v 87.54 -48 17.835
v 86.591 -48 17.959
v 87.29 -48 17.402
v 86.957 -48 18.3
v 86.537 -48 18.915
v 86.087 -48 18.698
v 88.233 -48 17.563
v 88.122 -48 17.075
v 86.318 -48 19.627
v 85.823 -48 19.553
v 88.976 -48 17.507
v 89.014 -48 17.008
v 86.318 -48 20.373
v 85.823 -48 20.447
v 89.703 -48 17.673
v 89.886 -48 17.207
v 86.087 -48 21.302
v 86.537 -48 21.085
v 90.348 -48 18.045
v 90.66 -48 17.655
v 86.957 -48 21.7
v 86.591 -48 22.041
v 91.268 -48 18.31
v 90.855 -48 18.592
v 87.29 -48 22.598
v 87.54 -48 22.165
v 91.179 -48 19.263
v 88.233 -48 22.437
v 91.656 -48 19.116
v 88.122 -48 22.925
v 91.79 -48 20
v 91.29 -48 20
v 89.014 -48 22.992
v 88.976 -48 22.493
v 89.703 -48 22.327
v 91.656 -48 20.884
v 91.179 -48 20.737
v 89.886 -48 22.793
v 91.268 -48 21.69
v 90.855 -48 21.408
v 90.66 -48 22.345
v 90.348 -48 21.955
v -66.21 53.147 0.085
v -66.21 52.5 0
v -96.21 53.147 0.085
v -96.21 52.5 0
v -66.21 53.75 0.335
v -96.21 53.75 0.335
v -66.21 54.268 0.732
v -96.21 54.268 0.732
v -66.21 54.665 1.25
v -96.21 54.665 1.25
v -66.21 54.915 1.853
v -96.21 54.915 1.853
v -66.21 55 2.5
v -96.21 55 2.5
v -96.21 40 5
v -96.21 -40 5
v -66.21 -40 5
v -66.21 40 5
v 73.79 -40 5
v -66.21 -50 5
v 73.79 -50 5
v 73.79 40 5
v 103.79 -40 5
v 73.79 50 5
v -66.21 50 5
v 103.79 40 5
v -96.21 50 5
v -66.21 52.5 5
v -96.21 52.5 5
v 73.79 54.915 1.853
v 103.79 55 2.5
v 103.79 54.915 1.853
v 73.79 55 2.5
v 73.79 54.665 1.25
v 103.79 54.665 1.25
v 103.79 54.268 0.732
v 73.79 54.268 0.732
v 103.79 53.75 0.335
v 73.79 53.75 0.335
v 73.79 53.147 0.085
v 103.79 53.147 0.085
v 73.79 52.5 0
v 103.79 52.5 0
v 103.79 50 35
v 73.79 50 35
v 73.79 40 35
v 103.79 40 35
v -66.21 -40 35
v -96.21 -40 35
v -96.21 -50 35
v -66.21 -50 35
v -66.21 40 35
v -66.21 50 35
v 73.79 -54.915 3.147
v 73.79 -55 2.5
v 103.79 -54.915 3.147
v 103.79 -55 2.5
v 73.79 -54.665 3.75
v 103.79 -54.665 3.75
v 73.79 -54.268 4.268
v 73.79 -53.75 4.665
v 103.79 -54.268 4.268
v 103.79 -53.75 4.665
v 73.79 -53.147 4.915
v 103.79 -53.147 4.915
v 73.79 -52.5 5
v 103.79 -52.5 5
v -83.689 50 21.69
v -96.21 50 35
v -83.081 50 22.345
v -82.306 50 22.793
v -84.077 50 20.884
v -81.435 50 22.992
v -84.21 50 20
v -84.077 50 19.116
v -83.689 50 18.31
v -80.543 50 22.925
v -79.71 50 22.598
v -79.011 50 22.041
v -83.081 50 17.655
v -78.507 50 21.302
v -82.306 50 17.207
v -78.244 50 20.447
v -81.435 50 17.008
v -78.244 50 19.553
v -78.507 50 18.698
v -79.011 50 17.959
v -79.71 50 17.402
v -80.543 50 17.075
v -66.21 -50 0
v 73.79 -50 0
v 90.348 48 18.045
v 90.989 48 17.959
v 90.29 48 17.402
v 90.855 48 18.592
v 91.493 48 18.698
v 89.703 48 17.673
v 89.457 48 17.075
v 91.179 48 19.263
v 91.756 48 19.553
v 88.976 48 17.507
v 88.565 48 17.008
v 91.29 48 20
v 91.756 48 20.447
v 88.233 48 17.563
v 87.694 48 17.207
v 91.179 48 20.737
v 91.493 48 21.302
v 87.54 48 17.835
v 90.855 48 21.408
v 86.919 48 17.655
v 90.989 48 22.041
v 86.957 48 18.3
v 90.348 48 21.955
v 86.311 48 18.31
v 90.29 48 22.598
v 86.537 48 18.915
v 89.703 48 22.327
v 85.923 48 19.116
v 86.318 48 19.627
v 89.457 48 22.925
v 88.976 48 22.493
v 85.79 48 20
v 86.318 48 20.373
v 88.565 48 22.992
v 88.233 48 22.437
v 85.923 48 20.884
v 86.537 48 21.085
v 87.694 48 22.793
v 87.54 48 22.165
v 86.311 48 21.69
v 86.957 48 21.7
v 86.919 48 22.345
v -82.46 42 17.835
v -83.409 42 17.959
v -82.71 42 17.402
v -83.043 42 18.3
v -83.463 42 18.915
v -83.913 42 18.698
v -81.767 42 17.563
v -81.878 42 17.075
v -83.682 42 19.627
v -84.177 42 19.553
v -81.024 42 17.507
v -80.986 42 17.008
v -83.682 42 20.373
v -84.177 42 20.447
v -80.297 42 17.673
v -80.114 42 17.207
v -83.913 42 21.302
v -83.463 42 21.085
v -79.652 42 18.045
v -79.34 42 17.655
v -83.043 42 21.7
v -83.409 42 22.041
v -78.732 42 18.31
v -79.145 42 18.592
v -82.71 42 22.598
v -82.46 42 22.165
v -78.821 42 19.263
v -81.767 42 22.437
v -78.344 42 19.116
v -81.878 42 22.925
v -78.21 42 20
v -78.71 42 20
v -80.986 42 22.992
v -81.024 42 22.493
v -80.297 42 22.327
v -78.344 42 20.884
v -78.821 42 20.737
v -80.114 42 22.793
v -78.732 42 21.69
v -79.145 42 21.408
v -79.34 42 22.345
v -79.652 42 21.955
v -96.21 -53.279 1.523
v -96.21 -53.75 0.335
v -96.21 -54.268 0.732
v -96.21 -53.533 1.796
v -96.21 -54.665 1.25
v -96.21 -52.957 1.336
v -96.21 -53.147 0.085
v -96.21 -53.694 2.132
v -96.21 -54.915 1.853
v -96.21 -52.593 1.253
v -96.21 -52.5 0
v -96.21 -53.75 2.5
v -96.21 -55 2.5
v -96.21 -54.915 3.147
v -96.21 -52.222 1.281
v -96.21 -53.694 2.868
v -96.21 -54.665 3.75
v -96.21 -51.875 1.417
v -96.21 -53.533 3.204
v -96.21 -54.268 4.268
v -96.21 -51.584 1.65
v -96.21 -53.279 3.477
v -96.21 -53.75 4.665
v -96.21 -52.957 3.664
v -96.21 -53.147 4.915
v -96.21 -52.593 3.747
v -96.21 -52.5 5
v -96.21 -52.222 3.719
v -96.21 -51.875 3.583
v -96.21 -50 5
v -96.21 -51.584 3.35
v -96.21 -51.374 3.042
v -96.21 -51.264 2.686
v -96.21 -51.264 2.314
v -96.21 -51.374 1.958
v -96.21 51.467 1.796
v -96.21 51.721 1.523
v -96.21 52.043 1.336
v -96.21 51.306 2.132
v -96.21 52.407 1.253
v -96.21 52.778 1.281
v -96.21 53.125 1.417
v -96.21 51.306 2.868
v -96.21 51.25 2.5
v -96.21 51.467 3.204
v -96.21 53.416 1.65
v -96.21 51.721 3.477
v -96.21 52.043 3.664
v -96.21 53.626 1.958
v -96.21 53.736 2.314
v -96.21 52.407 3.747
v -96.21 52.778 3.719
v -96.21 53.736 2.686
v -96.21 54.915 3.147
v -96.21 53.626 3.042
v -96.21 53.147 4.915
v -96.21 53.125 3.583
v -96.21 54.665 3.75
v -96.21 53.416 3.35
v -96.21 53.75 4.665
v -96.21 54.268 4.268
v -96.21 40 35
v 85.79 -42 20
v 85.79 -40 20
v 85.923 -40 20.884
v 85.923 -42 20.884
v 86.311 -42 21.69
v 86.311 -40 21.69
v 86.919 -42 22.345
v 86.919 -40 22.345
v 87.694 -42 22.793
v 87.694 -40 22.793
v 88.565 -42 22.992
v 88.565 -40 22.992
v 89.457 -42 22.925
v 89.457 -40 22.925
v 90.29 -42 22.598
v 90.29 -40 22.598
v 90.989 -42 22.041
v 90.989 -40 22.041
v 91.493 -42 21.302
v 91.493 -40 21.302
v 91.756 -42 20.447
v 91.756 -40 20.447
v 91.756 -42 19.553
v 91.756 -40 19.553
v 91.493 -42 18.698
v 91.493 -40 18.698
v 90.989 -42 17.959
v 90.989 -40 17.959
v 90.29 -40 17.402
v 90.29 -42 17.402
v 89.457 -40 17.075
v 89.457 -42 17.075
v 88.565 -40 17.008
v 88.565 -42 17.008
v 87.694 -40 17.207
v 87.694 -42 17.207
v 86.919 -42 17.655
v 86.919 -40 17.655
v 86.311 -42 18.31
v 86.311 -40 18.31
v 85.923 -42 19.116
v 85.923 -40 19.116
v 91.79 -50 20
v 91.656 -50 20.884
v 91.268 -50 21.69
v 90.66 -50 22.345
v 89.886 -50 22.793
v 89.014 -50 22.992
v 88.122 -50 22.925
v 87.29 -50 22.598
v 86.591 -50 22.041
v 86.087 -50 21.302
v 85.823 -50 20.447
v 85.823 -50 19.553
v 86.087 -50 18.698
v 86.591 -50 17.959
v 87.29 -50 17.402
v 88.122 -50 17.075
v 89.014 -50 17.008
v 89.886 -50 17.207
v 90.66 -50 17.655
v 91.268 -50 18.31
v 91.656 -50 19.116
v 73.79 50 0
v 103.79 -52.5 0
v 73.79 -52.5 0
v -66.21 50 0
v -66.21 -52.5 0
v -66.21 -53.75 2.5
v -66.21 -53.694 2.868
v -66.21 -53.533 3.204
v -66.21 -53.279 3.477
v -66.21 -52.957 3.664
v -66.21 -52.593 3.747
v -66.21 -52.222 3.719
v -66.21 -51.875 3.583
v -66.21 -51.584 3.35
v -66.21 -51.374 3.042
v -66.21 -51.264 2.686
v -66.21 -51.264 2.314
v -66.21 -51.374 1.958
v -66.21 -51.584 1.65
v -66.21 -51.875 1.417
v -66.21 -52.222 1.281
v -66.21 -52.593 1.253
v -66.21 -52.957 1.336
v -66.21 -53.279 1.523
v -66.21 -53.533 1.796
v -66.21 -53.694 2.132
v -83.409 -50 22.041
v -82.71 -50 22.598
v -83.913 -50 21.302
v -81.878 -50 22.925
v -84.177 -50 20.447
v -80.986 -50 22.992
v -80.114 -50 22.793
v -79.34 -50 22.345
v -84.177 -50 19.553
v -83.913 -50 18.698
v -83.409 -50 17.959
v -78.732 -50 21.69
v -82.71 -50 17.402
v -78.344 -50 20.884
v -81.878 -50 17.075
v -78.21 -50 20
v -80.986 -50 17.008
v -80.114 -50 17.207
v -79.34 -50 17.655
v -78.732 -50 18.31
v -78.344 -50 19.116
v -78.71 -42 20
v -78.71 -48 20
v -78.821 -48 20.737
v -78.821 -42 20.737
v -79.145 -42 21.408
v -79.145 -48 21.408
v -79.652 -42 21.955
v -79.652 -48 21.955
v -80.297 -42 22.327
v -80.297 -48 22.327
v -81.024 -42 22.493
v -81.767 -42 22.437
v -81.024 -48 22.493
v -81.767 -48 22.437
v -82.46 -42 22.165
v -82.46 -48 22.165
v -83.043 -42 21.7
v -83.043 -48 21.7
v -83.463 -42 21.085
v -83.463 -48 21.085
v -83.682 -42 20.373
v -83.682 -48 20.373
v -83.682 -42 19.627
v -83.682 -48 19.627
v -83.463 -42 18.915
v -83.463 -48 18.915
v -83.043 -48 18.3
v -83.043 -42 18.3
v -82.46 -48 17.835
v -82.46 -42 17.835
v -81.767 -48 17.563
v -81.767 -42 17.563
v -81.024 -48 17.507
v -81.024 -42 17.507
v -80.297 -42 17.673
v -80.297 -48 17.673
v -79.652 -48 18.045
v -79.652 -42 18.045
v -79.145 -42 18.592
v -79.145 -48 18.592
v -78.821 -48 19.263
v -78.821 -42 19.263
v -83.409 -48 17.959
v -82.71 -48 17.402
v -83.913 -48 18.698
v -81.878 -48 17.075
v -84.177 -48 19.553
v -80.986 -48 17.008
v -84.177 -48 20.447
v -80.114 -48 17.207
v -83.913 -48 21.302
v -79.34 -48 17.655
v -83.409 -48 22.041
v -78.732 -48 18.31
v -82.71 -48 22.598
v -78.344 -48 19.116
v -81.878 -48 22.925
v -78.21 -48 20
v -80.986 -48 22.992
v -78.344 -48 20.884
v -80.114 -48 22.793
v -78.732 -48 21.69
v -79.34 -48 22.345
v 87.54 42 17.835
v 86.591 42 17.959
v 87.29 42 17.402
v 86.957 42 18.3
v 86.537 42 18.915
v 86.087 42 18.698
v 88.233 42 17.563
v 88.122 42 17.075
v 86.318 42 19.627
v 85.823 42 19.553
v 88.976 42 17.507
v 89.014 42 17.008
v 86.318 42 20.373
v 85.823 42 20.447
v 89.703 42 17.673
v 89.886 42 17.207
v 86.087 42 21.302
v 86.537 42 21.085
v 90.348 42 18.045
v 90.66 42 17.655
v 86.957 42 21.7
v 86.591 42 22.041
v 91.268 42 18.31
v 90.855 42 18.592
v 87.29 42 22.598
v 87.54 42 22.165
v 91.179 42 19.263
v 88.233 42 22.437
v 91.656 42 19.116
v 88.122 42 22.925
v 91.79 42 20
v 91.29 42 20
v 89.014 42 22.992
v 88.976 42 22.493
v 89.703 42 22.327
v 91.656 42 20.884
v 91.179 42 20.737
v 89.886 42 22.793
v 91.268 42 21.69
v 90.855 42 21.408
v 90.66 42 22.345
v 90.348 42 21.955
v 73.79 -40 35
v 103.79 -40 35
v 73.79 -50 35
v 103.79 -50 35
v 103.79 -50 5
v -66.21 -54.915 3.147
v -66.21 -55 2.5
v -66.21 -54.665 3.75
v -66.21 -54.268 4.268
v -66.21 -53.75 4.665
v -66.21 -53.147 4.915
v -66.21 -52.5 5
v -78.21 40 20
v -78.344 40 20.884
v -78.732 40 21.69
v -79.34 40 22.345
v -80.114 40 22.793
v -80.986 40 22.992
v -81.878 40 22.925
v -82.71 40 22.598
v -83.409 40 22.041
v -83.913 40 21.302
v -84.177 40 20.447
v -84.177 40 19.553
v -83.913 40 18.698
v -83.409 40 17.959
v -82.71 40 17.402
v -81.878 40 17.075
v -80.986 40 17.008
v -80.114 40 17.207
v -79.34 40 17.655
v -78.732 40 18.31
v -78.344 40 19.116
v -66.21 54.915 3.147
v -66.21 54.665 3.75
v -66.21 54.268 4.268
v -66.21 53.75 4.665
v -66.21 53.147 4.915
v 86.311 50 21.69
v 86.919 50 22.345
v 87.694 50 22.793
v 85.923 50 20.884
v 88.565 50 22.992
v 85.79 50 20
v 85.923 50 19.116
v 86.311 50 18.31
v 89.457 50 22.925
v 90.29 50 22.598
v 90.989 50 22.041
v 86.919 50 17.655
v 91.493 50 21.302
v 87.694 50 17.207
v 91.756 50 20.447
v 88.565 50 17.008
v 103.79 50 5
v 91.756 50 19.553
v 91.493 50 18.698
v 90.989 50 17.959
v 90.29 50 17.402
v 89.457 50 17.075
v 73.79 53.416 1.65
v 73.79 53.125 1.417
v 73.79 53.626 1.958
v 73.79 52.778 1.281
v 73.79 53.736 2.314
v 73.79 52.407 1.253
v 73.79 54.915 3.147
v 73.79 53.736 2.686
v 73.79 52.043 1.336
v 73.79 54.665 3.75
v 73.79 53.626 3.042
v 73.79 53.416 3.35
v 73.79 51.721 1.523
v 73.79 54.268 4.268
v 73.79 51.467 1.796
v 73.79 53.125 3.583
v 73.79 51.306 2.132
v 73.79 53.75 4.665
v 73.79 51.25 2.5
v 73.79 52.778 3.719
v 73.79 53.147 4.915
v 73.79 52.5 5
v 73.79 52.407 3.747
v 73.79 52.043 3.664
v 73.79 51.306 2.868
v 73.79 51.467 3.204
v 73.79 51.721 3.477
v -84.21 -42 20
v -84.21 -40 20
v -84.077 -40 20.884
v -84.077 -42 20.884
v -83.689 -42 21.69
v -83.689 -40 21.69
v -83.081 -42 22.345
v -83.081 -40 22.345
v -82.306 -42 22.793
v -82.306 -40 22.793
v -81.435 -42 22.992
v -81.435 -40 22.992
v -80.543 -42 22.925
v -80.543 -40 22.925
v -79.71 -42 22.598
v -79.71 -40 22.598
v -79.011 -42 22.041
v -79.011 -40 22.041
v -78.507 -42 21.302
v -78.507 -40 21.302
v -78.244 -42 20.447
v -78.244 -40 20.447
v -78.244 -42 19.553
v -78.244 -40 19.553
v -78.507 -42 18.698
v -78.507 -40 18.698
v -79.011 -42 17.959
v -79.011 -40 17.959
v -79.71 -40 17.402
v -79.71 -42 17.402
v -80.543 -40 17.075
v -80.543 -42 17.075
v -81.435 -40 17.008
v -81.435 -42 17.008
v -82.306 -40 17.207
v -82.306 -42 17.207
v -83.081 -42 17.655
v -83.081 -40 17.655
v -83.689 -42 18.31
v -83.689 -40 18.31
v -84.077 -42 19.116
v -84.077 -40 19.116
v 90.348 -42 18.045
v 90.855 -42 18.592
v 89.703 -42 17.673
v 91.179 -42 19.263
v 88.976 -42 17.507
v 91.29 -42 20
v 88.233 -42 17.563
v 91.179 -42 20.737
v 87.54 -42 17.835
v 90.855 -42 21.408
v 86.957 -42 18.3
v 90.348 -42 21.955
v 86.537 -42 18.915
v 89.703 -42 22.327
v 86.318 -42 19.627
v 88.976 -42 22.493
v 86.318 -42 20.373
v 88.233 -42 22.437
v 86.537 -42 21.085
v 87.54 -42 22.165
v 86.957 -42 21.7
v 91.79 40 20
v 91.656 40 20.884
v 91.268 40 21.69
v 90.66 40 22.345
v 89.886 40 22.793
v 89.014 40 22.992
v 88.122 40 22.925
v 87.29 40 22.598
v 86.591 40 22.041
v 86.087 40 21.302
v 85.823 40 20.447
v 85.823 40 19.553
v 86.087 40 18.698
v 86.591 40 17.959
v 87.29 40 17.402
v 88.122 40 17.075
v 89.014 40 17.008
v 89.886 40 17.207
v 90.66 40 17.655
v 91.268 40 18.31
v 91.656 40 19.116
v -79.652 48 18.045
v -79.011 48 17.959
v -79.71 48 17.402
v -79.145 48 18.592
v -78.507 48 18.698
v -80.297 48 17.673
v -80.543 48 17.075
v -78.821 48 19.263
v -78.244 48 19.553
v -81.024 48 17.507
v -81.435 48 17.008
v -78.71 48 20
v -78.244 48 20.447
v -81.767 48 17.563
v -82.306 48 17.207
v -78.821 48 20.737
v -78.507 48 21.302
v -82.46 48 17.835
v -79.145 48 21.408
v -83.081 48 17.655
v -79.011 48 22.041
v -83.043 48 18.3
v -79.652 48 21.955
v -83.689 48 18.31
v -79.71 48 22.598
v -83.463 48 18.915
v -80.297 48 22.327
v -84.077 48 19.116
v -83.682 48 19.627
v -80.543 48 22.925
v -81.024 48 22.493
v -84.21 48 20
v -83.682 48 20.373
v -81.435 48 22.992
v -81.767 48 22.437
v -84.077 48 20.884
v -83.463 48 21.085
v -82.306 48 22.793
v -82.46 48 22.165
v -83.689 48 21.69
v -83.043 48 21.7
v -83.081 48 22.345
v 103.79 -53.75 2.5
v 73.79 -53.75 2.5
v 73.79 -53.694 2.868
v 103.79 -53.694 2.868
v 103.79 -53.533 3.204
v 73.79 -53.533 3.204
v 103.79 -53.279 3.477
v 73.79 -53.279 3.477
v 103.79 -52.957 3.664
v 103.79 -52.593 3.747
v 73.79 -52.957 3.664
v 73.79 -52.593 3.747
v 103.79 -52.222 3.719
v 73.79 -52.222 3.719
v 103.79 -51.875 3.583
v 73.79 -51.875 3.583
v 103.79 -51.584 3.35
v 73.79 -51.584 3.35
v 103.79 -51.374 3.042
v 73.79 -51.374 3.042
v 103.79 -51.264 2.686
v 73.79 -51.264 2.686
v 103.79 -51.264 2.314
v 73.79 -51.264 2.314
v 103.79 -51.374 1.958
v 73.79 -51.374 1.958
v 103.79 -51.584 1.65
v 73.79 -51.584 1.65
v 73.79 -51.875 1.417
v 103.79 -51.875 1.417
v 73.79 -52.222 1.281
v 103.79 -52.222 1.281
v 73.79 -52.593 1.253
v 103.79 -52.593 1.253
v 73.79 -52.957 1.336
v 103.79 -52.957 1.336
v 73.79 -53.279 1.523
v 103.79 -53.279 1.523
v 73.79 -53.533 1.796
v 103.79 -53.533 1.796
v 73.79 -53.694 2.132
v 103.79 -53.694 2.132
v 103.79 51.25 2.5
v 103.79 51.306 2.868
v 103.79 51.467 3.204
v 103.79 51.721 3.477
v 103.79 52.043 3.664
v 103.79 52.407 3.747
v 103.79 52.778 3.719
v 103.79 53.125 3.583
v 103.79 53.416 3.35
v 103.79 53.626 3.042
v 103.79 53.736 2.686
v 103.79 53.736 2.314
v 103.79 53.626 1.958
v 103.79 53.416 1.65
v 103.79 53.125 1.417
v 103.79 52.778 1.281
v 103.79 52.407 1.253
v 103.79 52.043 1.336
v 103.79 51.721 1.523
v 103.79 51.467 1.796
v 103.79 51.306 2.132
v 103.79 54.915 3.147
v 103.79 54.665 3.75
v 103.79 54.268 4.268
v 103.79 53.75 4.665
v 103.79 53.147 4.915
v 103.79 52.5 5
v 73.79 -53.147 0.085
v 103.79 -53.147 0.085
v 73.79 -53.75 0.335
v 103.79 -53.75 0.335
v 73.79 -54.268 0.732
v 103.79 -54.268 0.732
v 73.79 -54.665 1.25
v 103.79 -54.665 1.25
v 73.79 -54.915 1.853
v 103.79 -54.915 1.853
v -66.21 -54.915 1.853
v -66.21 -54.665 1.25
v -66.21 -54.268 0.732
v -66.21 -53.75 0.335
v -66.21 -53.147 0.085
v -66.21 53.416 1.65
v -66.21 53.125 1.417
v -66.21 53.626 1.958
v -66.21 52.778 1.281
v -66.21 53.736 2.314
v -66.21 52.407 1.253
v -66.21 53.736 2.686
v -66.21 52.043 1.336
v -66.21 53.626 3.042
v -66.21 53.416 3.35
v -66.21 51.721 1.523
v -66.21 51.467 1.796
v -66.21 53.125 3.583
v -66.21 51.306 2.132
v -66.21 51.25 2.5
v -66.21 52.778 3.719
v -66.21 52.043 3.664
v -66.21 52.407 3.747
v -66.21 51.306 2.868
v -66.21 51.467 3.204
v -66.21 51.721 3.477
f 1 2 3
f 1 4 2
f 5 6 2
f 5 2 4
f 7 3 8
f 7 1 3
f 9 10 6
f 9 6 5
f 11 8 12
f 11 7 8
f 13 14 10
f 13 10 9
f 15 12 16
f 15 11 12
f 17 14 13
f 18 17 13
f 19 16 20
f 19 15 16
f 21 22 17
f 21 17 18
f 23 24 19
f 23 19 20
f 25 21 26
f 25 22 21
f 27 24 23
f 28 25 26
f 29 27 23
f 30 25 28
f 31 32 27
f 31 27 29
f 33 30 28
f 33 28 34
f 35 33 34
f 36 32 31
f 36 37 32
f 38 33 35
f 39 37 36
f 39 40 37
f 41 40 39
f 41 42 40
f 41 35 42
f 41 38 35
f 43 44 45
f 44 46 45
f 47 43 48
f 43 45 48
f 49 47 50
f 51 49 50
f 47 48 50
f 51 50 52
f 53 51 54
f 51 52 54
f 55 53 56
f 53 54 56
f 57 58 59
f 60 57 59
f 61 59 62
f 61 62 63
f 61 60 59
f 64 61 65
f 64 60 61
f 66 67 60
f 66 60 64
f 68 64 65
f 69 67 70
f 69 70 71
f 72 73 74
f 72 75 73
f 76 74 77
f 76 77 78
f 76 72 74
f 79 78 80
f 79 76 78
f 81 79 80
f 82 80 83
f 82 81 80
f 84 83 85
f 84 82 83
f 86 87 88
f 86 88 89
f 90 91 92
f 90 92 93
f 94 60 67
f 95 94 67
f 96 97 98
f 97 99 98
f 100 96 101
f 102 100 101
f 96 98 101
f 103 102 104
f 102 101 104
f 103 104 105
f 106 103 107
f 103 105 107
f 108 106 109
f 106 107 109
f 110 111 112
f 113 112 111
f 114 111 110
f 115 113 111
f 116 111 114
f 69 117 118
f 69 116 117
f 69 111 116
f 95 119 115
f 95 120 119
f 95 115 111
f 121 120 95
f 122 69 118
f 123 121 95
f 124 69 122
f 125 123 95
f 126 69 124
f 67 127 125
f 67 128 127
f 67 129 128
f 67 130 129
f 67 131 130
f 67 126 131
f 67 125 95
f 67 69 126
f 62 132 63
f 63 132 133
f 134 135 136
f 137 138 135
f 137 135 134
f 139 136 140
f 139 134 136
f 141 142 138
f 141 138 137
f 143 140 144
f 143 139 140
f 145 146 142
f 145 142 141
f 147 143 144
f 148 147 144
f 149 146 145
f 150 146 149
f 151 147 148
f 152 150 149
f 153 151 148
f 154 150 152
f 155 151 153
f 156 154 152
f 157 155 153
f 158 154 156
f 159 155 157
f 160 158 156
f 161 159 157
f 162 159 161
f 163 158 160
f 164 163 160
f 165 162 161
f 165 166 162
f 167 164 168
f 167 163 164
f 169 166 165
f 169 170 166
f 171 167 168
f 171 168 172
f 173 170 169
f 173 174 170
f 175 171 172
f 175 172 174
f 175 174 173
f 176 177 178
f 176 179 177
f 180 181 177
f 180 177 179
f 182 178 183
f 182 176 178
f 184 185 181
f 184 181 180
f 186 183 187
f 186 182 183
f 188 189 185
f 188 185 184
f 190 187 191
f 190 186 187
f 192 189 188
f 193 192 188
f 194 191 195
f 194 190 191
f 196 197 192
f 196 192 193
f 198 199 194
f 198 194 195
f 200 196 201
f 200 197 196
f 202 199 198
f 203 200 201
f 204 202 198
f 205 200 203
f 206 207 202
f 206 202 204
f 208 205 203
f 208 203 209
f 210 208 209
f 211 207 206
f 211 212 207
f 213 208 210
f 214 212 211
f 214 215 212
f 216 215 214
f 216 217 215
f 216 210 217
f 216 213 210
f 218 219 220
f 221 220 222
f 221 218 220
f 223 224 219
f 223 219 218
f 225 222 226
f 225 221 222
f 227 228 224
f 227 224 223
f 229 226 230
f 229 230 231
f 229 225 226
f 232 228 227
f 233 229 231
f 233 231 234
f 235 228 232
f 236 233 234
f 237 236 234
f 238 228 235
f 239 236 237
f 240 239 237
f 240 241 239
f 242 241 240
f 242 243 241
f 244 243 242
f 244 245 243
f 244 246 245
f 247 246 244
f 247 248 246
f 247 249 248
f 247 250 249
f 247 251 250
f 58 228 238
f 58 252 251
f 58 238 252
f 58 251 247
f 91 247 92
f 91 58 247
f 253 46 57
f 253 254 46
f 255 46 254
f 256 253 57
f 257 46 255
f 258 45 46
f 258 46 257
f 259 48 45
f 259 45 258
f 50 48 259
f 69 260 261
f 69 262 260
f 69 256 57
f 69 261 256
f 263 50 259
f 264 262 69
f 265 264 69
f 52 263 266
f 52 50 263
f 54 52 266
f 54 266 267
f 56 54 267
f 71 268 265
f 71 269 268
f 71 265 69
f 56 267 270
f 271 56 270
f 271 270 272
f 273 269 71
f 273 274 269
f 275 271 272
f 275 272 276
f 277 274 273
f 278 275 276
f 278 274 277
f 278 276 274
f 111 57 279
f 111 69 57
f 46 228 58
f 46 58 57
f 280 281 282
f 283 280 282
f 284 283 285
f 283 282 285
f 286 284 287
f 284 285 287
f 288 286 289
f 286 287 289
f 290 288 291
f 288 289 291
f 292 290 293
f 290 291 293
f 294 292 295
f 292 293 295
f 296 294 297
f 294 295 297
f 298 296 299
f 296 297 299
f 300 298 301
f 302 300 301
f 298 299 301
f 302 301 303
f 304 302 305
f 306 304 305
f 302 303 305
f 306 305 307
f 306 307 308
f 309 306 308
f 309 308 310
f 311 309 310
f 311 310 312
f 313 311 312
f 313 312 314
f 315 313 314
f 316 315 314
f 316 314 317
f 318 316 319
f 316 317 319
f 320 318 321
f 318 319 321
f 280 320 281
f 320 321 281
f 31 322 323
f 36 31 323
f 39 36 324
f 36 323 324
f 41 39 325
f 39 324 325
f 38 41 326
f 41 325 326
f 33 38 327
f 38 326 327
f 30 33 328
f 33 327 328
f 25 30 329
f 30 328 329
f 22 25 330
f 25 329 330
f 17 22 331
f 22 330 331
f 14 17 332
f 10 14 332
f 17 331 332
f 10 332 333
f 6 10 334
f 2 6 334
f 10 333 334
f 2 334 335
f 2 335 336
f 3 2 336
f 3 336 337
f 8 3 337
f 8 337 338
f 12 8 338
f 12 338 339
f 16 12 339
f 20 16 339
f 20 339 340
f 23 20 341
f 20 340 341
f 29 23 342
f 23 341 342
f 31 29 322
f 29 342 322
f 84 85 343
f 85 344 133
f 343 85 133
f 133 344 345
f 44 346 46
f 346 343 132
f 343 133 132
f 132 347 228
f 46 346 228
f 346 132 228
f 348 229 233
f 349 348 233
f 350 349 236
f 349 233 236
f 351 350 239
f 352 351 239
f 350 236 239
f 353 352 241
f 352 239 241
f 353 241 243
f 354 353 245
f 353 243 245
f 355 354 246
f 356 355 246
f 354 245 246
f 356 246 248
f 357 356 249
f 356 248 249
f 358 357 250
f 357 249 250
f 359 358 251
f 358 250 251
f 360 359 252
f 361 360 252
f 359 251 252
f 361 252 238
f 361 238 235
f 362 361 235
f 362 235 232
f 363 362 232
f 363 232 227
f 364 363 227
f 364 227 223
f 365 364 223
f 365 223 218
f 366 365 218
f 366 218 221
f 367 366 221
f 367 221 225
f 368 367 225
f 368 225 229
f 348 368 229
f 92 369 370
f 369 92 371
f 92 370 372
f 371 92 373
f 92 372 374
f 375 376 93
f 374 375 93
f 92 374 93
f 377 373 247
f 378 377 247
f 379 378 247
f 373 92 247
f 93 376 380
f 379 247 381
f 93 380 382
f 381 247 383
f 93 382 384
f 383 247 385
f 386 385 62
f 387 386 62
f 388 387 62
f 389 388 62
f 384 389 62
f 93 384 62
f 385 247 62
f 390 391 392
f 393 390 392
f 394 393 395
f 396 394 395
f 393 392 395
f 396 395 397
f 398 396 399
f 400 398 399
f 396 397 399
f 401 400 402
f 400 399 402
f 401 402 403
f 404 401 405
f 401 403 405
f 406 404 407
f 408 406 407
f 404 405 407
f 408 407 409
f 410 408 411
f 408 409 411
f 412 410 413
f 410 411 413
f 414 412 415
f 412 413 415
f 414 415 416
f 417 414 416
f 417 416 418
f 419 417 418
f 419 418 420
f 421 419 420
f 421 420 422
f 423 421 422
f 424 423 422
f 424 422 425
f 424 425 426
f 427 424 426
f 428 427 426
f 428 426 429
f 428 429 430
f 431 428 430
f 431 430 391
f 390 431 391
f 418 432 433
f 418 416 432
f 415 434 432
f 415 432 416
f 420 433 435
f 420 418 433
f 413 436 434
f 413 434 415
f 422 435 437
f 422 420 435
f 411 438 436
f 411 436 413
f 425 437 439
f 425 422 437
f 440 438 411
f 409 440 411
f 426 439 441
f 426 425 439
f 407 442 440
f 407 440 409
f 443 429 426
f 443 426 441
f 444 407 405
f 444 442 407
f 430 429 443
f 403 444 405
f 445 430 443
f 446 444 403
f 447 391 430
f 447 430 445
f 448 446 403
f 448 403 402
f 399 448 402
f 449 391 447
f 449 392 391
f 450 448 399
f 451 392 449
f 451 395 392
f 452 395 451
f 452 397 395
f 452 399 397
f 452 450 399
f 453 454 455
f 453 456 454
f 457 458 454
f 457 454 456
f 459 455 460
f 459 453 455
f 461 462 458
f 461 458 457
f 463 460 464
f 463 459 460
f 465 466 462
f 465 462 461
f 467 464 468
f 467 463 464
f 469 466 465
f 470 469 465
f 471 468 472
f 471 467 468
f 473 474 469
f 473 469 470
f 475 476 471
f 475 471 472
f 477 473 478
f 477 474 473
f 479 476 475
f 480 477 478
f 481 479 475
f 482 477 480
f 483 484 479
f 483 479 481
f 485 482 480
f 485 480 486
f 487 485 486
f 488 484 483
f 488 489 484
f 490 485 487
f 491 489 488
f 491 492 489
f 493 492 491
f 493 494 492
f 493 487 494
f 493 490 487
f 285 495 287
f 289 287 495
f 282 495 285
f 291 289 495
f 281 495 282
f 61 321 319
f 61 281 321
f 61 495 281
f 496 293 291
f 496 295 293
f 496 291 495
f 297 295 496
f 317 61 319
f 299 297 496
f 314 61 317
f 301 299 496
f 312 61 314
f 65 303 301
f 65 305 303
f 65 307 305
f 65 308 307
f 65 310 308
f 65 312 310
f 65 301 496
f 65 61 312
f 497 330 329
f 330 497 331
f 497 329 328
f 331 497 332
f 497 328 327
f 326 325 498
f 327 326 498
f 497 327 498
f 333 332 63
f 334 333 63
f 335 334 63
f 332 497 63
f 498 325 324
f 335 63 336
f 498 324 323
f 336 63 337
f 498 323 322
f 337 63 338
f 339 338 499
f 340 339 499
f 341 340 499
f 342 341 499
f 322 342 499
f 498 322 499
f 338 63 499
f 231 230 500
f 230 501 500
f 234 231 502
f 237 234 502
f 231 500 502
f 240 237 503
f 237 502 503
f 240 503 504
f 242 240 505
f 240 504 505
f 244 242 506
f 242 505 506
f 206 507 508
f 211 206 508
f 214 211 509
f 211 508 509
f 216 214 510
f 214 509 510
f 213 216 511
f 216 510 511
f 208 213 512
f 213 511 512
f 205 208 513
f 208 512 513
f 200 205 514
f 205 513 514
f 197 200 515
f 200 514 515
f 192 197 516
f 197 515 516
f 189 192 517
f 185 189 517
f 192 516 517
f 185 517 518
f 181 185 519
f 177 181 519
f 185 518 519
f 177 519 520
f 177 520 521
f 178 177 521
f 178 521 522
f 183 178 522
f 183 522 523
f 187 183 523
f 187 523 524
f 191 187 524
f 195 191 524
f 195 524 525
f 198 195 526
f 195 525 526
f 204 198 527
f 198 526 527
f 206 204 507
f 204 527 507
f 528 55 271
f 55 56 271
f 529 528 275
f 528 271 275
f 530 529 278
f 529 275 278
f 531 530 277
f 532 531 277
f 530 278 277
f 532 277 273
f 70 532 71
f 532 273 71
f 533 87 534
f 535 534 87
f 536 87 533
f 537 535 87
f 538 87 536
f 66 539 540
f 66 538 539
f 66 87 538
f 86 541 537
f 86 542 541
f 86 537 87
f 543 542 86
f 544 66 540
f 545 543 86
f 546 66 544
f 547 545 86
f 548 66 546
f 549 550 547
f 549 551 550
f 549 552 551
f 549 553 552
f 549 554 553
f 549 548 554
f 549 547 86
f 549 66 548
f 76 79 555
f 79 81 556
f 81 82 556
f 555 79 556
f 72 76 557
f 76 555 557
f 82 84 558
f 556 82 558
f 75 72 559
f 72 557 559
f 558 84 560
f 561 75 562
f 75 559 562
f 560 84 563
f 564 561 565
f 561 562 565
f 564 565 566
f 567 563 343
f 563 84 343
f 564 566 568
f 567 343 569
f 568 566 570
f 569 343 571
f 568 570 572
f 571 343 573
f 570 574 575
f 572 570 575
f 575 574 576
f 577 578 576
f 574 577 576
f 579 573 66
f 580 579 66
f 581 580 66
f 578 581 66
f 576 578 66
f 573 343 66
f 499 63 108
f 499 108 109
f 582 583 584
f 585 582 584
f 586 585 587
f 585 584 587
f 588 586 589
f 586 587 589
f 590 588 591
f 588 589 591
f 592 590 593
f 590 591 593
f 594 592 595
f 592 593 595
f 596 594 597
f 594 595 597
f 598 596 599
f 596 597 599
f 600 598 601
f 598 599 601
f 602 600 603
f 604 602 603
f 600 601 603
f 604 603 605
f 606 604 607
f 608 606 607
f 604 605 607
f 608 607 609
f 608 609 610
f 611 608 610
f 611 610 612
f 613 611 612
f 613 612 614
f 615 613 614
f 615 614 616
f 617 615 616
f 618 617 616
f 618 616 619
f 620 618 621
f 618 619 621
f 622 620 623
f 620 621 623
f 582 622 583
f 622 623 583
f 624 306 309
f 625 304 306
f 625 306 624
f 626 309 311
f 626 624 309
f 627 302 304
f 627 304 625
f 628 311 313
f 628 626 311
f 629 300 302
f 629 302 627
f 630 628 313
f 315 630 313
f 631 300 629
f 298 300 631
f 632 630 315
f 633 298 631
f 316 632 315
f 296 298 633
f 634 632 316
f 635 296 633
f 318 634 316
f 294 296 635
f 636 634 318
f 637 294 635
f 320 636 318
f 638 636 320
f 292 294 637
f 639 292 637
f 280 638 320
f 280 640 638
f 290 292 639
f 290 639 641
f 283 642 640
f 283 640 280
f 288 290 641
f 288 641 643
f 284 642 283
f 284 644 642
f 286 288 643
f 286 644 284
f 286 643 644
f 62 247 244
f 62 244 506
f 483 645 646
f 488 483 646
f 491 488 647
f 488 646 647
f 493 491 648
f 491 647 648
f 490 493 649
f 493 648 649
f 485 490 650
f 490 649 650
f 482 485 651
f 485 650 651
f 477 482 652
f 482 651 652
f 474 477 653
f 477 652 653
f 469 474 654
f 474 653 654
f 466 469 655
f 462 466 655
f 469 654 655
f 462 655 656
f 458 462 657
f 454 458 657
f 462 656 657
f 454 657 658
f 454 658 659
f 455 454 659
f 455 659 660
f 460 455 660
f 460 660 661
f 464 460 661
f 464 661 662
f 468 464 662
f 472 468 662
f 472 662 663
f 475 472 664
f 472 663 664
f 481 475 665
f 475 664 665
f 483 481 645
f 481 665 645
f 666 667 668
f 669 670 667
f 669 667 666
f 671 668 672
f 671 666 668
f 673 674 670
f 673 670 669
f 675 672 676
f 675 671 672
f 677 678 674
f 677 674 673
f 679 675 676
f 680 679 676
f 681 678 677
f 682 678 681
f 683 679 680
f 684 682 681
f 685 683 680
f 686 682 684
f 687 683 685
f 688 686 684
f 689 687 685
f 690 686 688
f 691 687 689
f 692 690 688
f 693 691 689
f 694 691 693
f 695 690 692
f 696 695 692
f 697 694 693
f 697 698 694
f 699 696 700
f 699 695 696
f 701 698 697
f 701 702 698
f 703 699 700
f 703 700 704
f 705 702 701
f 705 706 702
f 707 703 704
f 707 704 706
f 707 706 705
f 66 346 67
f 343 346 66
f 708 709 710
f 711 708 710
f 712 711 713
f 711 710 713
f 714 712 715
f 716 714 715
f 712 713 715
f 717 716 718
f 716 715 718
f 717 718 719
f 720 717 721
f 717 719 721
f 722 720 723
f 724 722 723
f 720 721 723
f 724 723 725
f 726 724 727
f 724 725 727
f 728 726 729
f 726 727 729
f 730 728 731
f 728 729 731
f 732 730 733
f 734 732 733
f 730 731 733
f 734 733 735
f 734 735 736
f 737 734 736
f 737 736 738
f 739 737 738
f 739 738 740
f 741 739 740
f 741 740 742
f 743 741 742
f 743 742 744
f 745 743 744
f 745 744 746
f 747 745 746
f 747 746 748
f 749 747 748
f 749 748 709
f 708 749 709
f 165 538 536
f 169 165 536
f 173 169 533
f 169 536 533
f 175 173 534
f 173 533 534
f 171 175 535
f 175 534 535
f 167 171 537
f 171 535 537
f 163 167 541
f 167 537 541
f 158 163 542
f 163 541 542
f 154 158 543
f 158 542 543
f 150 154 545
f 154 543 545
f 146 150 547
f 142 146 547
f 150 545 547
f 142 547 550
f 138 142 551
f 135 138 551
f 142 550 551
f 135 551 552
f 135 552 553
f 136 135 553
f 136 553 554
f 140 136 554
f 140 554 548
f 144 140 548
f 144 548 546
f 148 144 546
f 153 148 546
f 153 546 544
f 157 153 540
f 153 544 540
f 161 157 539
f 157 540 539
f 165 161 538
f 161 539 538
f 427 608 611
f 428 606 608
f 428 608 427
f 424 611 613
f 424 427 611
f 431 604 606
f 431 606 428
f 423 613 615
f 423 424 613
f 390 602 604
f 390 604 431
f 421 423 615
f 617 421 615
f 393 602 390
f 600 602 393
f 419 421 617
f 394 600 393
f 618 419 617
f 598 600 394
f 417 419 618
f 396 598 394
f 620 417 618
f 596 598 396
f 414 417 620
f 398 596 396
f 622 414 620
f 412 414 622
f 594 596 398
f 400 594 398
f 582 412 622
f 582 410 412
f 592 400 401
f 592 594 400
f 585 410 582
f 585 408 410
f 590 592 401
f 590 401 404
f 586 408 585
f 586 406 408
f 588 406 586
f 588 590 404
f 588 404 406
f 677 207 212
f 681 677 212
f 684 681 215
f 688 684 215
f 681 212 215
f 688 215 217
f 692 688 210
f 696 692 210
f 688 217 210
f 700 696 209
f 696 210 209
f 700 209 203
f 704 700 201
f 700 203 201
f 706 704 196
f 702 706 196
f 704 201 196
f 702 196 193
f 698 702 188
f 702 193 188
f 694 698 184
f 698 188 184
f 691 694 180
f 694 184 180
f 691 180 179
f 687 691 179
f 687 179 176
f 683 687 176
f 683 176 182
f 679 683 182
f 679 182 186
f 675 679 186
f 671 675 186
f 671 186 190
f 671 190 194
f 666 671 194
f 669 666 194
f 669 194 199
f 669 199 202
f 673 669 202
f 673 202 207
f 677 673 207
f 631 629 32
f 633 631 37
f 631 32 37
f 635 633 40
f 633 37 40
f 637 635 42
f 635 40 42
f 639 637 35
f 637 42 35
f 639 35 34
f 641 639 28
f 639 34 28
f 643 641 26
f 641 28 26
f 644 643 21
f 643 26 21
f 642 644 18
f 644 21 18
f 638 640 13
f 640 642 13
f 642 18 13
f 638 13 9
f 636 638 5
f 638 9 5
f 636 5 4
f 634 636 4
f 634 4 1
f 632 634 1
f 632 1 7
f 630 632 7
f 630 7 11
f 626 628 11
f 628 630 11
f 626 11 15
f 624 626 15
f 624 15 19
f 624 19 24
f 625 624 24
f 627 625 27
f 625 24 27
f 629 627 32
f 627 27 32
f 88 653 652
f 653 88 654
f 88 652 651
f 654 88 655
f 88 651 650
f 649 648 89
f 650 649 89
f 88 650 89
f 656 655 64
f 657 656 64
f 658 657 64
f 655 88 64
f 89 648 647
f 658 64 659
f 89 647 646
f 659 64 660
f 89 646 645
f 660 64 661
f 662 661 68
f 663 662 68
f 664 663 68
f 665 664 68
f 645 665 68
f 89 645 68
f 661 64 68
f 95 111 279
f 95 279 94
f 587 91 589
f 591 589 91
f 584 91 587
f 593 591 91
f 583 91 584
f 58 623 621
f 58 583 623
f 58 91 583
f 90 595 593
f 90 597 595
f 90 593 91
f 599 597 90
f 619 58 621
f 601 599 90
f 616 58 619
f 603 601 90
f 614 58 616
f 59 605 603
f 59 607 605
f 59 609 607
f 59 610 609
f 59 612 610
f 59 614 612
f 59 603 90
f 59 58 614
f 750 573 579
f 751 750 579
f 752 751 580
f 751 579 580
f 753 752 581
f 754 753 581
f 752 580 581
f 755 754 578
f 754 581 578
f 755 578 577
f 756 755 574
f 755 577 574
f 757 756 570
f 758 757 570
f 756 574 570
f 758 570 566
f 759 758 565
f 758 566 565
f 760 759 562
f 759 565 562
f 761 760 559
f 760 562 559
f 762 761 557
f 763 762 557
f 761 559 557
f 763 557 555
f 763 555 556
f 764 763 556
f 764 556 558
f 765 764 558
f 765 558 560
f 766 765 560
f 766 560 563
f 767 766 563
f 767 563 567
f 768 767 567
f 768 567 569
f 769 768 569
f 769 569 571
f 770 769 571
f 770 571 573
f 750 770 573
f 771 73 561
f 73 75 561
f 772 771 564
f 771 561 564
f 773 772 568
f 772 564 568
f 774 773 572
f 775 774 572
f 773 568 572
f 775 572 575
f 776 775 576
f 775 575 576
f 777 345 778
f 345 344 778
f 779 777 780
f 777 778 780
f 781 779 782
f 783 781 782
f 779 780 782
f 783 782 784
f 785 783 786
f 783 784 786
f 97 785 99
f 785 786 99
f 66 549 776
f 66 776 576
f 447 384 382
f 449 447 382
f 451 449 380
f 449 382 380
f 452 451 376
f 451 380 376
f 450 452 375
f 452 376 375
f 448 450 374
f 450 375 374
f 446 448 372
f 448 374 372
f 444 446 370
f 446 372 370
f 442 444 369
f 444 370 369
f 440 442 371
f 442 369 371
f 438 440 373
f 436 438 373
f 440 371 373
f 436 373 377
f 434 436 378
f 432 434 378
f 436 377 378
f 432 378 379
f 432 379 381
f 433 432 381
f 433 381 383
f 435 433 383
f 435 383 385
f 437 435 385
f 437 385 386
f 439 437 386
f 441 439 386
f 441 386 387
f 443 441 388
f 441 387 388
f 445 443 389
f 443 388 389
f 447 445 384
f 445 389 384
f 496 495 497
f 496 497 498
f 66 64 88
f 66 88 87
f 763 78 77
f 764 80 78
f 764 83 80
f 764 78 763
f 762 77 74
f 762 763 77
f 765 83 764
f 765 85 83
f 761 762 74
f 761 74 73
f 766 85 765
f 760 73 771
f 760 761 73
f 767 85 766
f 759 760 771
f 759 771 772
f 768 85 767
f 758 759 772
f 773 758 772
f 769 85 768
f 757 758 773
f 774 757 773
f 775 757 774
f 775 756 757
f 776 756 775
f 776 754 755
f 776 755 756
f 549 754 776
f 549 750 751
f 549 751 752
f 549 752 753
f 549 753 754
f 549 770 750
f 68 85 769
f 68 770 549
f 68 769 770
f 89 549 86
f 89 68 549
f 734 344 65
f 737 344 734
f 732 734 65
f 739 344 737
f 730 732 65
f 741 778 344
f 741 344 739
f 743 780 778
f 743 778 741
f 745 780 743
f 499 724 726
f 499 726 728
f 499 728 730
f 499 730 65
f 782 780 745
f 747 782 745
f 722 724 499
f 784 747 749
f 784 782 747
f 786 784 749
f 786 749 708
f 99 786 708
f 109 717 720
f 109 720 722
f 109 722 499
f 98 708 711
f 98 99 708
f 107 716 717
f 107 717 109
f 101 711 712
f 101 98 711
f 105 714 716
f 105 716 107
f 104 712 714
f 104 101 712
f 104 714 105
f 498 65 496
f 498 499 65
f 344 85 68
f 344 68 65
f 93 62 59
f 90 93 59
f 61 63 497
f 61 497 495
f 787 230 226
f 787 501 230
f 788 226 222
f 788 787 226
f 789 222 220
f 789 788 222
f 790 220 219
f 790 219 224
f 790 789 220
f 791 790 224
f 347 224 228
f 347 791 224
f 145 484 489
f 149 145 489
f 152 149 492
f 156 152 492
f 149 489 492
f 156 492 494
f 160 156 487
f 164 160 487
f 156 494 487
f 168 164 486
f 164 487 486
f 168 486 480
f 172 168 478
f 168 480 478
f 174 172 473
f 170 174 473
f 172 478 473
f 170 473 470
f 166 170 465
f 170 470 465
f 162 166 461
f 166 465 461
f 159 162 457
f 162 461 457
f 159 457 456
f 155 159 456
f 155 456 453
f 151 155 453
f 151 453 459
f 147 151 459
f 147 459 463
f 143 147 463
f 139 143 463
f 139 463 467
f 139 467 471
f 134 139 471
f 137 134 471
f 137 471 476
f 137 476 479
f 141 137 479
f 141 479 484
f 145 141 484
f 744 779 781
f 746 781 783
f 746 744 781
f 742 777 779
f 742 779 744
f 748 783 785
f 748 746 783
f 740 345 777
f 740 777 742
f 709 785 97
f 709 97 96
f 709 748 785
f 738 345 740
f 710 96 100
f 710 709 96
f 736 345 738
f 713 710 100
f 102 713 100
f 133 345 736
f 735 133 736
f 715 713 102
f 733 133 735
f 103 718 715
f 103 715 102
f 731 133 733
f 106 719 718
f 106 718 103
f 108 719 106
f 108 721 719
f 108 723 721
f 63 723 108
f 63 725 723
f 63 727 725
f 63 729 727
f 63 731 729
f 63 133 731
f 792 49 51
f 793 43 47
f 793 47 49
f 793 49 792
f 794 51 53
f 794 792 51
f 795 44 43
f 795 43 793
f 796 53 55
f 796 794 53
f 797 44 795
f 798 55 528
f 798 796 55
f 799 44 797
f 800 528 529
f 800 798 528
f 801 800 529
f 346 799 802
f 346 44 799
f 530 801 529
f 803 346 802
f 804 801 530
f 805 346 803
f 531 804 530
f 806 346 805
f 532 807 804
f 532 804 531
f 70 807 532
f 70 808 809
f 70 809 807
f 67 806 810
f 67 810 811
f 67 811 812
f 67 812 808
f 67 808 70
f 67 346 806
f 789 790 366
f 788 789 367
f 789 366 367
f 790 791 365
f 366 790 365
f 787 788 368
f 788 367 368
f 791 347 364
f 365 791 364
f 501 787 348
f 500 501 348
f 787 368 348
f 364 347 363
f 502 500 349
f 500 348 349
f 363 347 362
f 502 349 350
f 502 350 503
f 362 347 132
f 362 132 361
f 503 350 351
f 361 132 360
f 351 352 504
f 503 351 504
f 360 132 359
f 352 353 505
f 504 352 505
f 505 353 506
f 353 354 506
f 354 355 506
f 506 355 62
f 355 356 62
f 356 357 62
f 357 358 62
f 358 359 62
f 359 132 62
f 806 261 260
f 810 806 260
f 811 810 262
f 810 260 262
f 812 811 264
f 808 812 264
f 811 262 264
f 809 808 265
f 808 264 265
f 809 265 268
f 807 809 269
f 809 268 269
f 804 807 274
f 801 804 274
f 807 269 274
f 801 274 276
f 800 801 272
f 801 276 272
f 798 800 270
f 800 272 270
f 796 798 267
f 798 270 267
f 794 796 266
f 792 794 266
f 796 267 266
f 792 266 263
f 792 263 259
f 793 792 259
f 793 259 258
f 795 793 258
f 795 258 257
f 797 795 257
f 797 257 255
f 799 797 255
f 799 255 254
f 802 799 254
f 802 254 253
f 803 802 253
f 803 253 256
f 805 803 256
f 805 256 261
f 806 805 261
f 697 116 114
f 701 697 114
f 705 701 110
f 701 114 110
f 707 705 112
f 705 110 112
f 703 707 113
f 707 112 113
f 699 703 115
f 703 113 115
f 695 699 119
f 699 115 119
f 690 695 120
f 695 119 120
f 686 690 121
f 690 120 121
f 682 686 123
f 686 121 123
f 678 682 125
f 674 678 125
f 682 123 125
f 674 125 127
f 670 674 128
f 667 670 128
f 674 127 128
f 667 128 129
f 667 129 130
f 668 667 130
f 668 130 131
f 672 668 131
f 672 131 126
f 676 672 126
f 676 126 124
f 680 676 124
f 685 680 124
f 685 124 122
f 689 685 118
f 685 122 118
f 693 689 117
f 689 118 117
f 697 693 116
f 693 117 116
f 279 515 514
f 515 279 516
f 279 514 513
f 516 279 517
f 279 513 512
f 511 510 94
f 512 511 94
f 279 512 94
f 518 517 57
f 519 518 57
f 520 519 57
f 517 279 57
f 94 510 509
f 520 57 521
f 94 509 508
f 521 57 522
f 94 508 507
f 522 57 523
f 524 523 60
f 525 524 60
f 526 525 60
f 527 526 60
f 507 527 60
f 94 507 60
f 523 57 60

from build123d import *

# Parameters (mm, degrees)
F0_W          = 200
F0_H          = 100
F1_DEPTH      = 5
F2_W          = 30
F2_H          = 10
F3_DEPTH      = 30
F4_R          = 2.5
F5_DEPTH      = 100.001
F6_R          = 3
F6_R_2        = 2.5
F7_DEPTH      = 2
F7_DEPTH_BACK = 25
F8_R          = 3
F8_R_2        = 2.5
F9_DEPTH      = 2
F10_R         = 3
F10_R_2       = 2.5
F11_DEPTH     = 2
F12_R         = 3
F12_R_2       = 2.5
F13_DEPTH     = 2
F14_R         = 3
F14_R_2       = 2.5
F15_DEPTH     = 2
F16_R         = 3
F16_R_2       = 2.5
F17_DEPTH     = 2
F18_W         = 30
F18_H         = 5
F19_DEPTH     = 5
F20_R         = 1.25
F21_DEPTH     = 200.001
F22_R         = 2.49999
F23_W         = 30
F23_H         = 5
F24_DEPTH     = 5
F25_R         = 1.25
F26_DEPTH     = 200.001
F27_R         = 2.49999


# Not quite as in the source:
# - a fillet or chamfer is up to 0.001 mm smaller than in the source, because OpenCascade refuses the exact size


with BuildPart() as f1:
    # F0 (on Top) → F1 (new body)
    with BuildSketch(Plane.XY):
        with Locations((3.7896726225, 0)):
            Rectangle(F0_W, F0_H)
    extrude(amount=F1_DEPTH)

    # F2 (on face) → F3 (join)
    with BuildSketch(Plane.XY.offset(5)):
        with Locations((-81.2103273775, 45)):
            Rectangle(F2_W, F2_H)
        with Locations((88.7896726225, 45)):
            Rectangle(F2_W, F2_H)
        with Locations((-81.2103273775, -45)):
            Rectangle(F2_W, F2_H)
        with Locations((88.7896726225, -45)):
            Rectangle(F2_W, F2_H)
    extrude(amount=F3_DEPTH)

    # F4 (on face) → F5 (cut, through all)
    with BuildSketch(Plane.XZ.offset(50)):
        with Locations((88.7896726225, 20)):
            Circle(F4_R)
        with Locations((-81.2103273775, 20)):
            Circle(F4_R)
    extrude(amount=-F5_DEPTH, mode=Mode.SUBTRACT)

    # F6 (on face) → F7 (cut, two sides)
    with BuildSketch(Plane.XZ.offset(50)) as f7_sk:
        with Locations((88.7896726225, 20)):
            Circle(F6_R)
        with Locations((88.7896726225, 20)):
            Circle(F6_R_2, mode=Mode.SUBTRACT)
        with Locations((-81.2103273775, 20)):
            Circle(F6_R)
        with Locations((-81.2103273775, 20)):
            Circle(F6_R_2, mode=Mode.SUBTRACT)
    extrude(amount=-F7_DEPTH, mode=Mode.SUBTRACT)
    extrude(f7_sk.sketch, amount=F7_DEPTH_BACK, mode=Mode.SUBTRACT)

    # F8 (on face) → F9 (cut)
    with BuildSketch(Plane.XZ.offset(-40)):
        with Locations((-81.2103273775, 20)):
            Circle(F8_R)
        with Locations((-81.2103273775, 20)):
            Circle(F8_R_2, mode=Mode.SUBTRACT)
    extrude(amount=-F9_DEPTH, mode=Mode.SUBTRACT)

    # F10 (on face) → F11 (cut)
    with BuildSketch(Plane.XZ.offset(-40)):
        with Locations((88.7896726225, 20)):
            Circle(F10_R)
        with Locations((88.7896726225, 20)):
            Circle(F10_R_2, mode=Mode.SUBTRACT)
    extrude(amount=-F11_DEPTH, mode=Mode.SUBTRACT)

    # F12 (on face) → F13 (cut)
    with BuildSketch(Plane(origin=(0, 50, 0), x_dir=(-1, 0, 0), z_dir=(0, 1, 0))):
        with Locations((81.2103273775, 20)):
            Circle(F12_R)
        with Locations((81.2103273775, 20)):
            Circle(F12_R_2, mode=Mode.SUBTRACT)
        with Locations((-88.7896726225, 20)):
            Circle(F12_R)
        with Locations((-88.7896726225, 20)):
            Circle(F12_R_2, mode=Mode.SUBTRACT)
    extrude(amount=-F13_DEPTH, mode=Mode.SUBTRACT)

    # F14 (on face) → F15 (cut)
    with BuildSketch(Plane(origin=(0, -40, 0), x_dir=(-1, 0, 0), z_dir=(0, 1, 0))):
        with Locations((81.2103273775, 20)):
            Circle(F14_R)
        with Locations((81.2103273775, 20)):
            Circle(F14_R_2, mode=Mode.SUBTRACT)
        with Locations((81.2103273775, 20)):
            Circle(F14_R_2)
    extrude(amount=-F15_DEPTH, mode=Mode.SUBTRACT)

    # F16 (on face) → F17 (cut)
    with BuildSketch(Plane(origin=(0, -40, 0), x_dir=(-1, 0, 0), z_dir=(0, 1, 0))):
        with Locations((-88.7896726225, 20)):
            Circle(F16_R)
        with Locations((-88.7896726225, 20)):
            Circle(F16_R_2, mode=Mode.SUBTRACT)
    extrude(amount=-F17_DEPTH, mode=Mode.SUBTRACT)

    # F18 (on face) → F19 (join)
    with BuildSketch(Plane.XZ.offset(50)):
        with Locations((-81.2103273775, 2.5)):
            Rectangle(F18_W, F18_H)
        with Locations((88.7896726225, 2.5)):
            Rectangle(F18_W, F18_H)
    extrude(amount=F19_DEPTH)

    # F20 (on face) → F21 (cut, through all)
    with BuildSketch(Plane(origin=(-96.2103273775, 0, 0), x_dir=(0, -1, 0), z_dir=(-1, 0, 0))):
        with Locations((52.5, 2.5)):
            Circle(F20_R)
    extrude(amount=-F21_DEPTH, mode=Mode.SUBTRACT)

    # F22 (radius 2.5 in the source; OpenCascade refuses exactly that, so slightly less here)
    f22_edges = [f1.edges().sort_by_distance(p)[0] for p in [
        (-81.210327, -55, 5),
        (-81.210327, -55, 0),
        (88.789673, -55, 5),
        (88.789673, -55, 0),
    ]]
    fillet(f22_edges, radius=F22_R)

    # F23 (on face) → F24 (join)
    with BuildSketch(Plane(origin=(0, 50, 0), x_dir=(-1, 0, 0), z_dir=(0, 1, 0))):
        with Locations((-88.7896726225, 2.5)):
            Rectangle(F23_W, F23_H)
        with Locations((81.2103273775, 2.5)):
            Rectangle(F23_W, F23_H)
    extrude(amount=F24_DEPTH)

    # F25 (on face) → F26 (cut, through all)
    with BuildSketch(Plane(origin=(-96.2103273775, 0, 0), x_dir=(0, -1, 0), z_dir=(-1, 0, 0))):
        with Locations((-52.5, 2.5)):
            Circle(F25_R)
    extrude(amount=-F26_DEPTH, mode=Mode.SUBTRACT)

    # F27 (radius 2.5 in the source; OpenCascade refuses exactly that, so slightly less here)
    f27_edges = [f1.edges().sort_by_distance(p)[0] for p in [
        (88.789673, 55, 5),
        (88.789673, 55, 0),
        (-81.210327, 55, 0),
        (-81.210327, 55, 5),
    ]]
    fillet(f27_edges, radius=F27_R)


solid = f1.part
